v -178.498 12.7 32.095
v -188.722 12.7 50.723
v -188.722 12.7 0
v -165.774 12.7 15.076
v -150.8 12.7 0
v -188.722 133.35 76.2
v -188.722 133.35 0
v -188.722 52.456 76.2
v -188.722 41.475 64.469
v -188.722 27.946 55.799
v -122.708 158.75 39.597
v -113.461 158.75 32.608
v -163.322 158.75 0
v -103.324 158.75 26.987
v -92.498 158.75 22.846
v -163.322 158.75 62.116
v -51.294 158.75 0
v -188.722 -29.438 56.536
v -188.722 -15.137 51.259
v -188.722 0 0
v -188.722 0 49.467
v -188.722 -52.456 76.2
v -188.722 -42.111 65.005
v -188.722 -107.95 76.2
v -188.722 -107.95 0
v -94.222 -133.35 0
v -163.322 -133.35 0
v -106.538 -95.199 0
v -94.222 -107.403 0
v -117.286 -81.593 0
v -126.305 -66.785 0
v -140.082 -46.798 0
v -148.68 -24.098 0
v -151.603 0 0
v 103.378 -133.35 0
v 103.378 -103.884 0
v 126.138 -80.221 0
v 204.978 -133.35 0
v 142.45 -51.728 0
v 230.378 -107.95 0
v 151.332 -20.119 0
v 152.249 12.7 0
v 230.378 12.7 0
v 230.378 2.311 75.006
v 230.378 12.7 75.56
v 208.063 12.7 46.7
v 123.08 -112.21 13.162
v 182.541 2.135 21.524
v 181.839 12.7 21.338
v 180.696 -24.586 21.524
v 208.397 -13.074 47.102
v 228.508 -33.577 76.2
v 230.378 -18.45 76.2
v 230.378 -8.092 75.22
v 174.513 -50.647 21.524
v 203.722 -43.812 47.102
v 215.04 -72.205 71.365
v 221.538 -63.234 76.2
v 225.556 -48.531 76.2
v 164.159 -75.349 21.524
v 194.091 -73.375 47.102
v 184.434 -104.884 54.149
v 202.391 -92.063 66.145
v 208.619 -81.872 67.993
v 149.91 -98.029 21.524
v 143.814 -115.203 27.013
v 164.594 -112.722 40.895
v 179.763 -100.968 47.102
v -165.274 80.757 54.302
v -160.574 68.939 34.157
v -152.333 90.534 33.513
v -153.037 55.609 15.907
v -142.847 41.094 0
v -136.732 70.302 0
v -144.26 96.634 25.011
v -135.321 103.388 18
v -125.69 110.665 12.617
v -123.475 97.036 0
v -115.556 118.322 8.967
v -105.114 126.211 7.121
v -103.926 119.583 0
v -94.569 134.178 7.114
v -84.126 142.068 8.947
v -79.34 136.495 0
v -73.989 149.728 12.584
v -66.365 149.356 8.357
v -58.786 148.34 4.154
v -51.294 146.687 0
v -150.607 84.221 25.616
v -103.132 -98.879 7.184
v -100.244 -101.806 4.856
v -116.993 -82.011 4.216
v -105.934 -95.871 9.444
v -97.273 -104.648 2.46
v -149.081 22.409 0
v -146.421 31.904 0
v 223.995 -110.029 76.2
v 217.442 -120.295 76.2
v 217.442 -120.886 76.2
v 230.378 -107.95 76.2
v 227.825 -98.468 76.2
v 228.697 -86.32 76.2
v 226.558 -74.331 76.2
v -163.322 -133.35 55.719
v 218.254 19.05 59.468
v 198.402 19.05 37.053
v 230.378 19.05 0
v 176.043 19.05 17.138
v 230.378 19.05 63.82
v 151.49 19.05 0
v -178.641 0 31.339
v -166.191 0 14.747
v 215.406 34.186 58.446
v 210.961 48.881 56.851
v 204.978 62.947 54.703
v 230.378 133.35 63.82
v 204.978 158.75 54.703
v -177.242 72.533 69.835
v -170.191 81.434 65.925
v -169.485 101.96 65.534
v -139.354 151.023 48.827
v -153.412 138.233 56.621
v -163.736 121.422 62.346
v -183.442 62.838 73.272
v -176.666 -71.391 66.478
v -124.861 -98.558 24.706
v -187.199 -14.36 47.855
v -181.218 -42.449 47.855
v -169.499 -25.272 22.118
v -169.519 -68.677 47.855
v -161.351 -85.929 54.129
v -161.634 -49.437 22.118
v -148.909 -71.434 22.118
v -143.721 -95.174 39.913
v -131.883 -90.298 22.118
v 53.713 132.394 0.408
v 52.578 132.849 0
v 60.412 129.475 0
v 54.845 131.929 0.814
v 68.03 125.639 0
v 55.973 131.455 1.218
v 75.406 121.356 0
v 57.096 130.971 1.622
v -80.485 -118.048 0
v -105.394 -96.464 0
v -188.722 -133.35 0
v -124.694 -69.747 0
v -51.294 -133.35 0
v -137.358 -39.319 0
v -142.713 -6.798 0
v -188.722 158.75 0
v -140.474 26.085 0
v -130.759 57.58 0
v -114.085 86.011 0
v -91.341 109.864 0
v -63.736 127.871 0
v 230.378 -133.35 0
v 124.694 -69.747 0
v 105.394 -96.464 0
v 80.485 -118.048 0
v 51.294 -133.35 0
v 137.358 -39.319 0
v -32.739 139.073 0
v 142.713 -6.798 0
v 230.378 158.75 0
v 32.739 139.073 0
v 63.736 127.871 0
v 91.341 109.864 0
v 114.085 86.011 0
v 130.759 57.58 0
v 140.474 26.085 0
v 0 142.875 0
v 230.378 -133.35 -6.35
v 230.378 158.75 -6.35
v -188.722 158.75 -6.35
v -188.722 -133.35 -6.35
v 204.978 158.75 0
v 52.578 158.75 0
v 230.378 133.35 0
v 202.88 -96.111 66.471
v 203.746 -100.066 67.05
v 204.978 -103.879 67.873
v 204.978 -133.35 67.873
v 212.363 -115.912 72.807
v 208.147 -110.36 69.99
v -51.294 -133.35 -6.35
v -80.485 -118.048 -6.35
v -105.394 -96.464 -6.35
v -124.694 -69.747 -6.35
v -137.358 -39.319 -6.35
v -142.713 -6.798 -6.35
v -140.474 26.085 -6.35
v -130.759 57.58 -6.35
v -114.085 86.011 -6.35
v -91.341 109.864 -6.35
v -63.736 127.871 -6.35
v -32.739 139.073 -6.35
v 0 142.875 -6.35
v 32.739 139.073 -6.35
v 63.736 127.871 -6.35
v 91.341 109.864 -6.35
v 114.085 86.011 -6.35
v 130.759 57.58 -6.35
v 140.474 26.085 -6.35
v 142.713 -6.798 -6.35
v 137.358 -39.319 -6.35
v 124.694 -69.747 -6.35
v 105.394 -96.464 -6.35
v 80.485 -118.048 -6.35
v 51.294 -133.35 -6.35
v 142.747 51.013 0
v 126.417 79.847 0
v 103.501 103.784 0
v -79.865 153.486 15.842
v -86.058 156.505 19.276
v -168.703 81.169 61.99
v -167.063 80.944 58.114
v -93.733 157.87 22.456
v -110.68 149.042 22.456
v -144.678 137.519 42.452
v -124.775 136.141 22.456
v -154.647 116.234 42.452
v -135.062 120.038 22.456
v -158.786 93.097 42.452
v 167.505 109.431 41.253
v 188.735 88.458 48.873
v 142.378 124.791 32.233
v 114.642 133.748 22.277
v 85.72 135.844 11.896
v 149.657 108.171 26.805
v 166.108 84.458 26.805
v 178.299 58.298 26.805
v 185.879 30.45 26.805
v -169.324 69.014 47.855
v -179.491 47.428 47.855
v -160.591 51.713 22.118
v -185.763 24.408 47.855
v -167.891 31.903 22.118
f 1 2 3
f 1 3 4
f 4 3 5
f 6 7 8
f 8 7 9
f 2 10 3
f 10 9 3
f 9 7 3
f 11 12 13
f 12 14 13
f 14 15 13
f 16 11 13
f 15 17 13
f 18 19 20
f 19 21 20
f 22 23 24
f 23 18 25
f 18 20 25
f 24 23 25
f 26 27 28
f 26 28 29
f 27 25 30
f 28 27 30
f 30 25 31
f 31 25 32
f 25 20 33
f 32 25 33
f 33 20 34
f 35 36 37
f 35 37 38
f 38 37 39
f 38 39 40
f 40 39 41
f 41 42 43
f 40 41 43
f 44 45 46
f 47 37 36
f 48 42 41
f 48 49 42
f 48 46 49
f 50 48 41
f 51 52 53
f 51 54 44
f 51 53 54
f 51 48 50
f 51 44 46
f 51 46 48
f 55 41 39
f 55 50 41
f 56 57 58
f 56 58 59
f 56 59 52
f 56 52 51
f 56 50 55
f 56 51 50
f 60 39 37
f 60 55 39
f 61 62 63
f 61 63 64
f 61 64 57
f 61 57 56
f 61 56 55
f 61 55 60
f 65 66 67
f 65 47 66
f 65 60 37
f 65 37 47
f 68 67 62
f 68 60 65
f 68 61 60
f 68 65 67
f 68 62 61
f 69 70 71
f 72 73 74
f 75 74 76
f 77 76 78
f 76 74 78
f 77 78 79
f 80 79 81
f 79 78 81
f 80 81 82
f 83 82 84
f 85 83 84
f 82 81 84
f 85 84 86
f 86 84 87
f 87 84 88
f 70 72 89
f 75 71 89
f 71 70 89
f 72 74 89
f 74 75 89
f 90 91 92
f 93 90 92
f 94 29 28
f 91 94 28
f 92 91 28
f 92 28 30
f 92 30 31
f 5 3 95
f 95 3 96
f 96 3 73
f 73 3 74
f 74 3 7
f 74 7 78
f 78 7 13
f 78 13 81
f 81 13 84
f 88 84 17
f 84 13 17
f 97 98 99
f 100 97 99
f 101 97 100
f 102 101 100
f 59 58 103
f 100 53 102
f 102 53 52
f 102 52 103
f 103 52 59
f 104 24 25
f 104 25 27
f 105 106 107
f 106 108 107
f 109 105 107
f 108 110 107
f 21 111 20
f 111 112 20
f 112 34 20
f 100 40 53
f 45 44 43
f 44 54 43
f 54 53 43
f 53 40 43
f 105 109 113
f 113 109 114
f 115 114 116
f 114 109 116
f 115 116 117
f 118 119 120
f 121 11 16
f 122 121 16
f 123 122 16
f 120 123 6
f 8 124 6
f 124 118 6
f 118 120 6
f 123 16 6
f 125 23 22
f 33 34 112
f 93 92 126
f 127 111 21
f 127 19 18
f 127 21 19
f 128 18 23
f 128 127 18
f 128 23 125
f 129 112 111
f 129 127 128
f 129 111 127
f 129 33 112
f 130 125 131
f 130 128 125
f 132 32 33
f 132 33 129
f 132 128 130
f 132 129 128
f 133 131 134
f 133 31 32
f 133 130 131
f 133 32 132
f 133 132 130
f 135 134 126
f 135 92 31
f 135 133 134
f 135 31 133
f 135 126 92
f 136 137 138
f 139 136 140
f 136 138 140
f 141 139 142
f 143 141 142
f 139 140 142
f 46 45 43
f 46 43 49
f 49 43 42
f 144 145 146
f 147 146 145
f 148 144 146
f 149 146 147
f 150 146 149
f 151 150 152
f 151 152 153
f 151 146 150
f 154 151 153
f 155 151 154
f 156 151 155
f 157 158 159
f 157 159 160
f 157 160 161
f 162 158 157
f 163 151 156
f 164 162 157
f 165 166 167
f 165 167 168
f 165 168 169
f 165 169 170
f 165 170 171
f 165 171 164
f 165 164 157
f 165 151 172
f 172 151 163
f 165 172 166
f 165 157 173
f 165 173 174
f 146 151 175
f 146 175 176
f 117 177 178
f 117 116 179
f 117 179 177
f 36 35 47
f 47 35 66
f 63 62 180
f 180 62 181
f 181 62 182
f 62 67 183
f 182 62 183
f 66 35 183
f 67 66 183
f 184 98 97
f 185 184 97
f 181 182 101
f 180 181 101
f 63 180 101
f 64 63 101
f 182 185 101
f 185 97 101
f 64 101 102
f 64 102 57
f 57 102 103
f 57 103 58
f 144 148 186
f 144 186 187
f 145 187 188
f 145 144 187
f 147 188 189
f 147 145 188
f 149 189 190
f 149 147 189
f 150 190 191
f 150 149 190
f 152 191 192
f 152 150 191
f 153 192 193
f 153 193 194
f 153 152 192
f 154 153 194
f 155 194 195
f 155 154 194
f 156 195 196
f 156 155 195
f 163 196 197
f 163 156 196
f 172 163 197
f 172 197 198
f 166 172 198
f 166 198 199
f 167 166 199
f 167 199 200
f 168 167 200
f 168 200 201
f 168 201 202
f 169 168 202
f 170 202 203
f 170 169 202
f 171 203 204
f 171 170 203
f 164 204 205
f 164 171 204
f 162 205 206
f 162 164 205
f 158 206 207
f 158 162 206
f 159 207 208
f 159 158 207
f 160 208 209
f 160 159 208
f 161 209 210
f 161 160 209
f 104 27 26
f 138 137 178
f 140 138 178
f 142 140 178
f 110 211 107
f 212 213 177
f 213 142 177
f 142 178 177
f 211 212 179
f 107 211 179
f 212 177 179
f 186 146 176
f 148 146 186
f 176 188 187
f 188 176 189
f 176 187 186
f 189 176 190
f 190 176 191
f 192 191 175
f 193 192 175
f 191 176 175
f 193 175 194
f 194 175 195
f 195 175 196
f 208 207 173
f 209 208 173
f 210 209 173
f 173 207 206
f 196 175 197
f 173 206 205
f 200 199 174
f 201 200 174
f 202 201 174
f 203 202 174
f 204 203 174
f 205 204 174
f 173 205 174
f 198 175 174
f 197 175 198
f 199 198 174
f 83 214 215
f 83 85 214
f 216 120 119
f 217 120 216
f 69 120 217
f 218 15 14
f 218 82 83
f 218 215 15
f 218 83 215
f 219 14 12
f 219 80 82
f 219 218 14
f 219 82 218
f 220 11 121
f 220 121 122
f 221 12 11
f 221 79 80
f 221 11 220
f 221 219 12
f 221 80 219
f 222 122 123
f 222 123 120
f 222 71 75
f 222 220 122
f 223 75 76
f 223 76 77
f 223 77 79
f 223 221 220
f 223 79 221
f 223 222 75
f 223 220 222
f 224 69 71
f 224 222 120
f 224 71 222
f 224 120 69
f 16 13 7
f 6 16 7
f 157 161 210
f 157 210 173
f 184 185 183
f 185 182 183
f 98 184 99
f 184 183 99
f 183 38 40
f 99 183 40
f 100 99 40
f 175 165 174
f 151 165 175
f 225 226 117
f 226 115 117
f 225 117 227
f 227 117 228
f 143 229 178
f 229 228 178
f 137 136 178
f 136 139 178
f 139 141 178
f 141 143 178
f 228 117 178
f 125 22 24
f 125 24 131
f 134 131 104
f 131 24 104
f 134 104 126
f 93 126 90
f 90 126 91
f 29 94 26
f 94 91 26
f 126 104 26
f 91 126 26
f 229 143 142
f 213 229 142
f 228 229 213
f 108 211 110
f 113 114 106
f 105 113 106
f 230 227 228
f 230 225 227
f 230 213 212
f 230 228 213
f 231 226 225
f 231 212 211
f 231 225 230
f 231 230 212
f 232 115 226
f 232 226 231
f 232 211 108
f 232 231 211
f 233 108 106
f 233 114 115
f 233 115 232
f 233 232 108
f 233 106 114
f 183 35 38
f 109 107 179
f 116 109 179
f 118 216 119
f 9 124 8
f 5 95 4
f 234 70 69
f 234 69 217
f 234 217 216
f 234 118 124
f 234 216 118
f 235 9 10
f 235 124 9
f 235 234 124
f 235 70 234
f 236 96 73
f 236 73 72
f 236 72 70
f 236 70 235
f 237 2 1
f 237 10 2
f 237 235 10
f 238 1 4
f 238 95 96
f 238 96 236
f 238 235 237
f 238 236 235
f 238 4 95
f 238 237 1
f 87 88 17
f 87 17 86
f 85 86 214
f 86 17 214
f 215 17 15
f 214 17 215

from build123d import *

# Parameters (mm, degrees)
F1_DEPTH       = 6.35
F3_DEPTH       = 76.2
F11_DEPTH      = 76.2
F13_DEPTH      = 127
F15_DEPTH      = 152.4
F17_DEPTH      = 152.4
F19_REACH      = 112.1220245843
F21_DEPTH      = 152.4
F25_DEPTH      = 152.4
F27_DEPTH      = 152.4
F31_DEPTH      = 76.201
F33_DEPTH      = 76.201
F36_ANGLE_BACK = 90
F36_ANGLE      = 180


with BuildPart() as f1:
    # F0 (on Top) → F1 (new body)
    with BuildSketch(Plane.XY):
        with BuildLine():
            Line((230.378, 158.75), (-188.722, 158.75))
            Line((-188.722, 158.75), (-188.722, -133.35))
            Line((-188.722, -133.35), (-51.293694788, -133.35))
            ThreePointArc((-51.293694788, -133.35), (-80.8847296533, 117.7748960259), (142.875, 0))
            ThreePointArc((142.875, 0), (117.7748960259, -80.8847296533), (51.293694788, -133.35))
            Line((51.2936947879, -133.35), (230.378, -133.35))
            Line((230.378, -133.35), (230.378, 158.75))
        make_face()
    extrude(amount=-F1_DEPTH)


with BuildPart() as f3:
    # F2 (on face) → F3 (new body)
    with BuildSketch(Plane.XY):
        with BuildLine():
            Line((-51.293694788, 133.35), (-51.293694788, 158.75))
            Line((-51.293694788, 158.75), (-188.722, 158.75))
            Line((-188.722, 158.75), (-188.722, 12.7))
            Line((-188.722, 12.7), (-142.3094361769, 12.7))
            ThreePointArc((-142.3094361769, 12.7), (-114.0598470315, 86.0442730235), (-51.293694788, 133.35))
        make_face()
    extrude(amount=F3_DEPTH)


with BuildPart() as f3b:
    # F2 (on face) → F3, piece 2 (new body)
    with BuildSketch(Plane.XY):
        with BuildLine():
            ThreePointArc((-94.2220017314, -107.4033519716), (-130.1446005841, -58.9546314026), (-142.875, 0))
            Line((-142.875, 0), (-188.722, 0))
            Line((-188.722, 0), (-188.722, -133.35))
            Line((-188.722, -133.35), (-94.2220017314, -133.35))
            Line((-94.2220017314, -133.35), (-94.2220017314, -107.4033519716))
        make_face()
    extrude(amount=F3_DEPTH)


with BuildPart() as f3c:
    # F2 (on face) → F3, piece 3 (new body)
    with BuildSketch(Plane.XY):
        with BuildLine():
            Line((230.378, -133.35), (230.378, 12.7))
            Line((230.378, 12.7), (142.3094361769, 12.7))
            ThreePointArc((142.3094361769, 12.7), (142.7335390138, 6.356293386), (142.875, 0))
            ThreePointArc((142.875, 0), (132.6337011755, -53.1184237106), (103.378, -98.6217762008))
            Line((103.378, -98.6217762008), (103.378, -133.35))
            Line((103.378, -133.35), (230.378, -133.35))
        make_face()
    extrude(amount=F3_DEPTH)


with BuildPart() as f3d:
    # F2 (on face) → F3, piece 4 (new body)
    with BuildSketch(Plane.XY):
        with BuildLine():
            Line((230.378, 19.05), (230.378, 158.75))
            Line((230.378, 158.75), (52.578, 158.75))
            Line((52.578, 158.75), (52.578, 132.8488597655))
            ThreePointArc((52.578, 132.8488597655), (112.5333352727, 88.0313244101), (141.5993048182, 19.05))
            Line((141.5993048182, 19.05), (230.378, 19.05))
        make_face()
    extrude(amount=F3_DEPTH)


with BuildPart() as f5_tool:
    # F4 (on Front) → F5 (revolve)
    with BuildSketch(Plane.XZ):
        with BuildLine():
            ThreePointArc((43.0044271052, -36.9679209035), (206.9335071058, 44.9737359045), (273.05, 215.9))
            ThreePointArc((273.05, 215.9), (206.9335071058, 386.8262640955), (43.0044271052, 468.7679209035))
            Line((43.0044271052, 468.7679209035), (43.0044271052, -36.9679209035))
        make_face()
    revolve(axis=Axis((19.05, 0, 121.6264636263), (0, 0, -1)))


with BuildPart() as f3_1:
    add(f3.part)

    # F5: cut by f5_tool
    add(f5_tool.part, mode=Mode.SUBTRACT)


with BuildPart() as f3b_1:
    add(f3b.part)

    # F5: cut by f5_tool
    add(f5_tool.part, mode=Mode.SUBTRACT)


with BuildPart() as f3c_1:
    add(f3c.part)

    # F5: cut by f5_tool
    add(f5_tool.part, mode=Mode.SUBTRACT)

    # F8 (on offset) → F9 (revolve, cut)
    with BuildSketch(Plane.XZ.offset(88.9)):
        with BuildLine():
            ThreePointArc((179.578, 63.5), (251.4200489686, 93.2579510314), (281.178, 165.1))
            ThreePointArc((281.178, 165.1), (251.4200489686, 236.9420489686), (179.578, 266.7))
            Line((179.578, 266.7), (179.578, 179.8048467159))
            Line((179.578, 179.8048467159), (179.578, 105.8732718945))
            Line((179.578, 105.8732718945), (179.578, 63.5))
        make_face()
    revolve(axis=Axis((179.578, -88.9, 186.2866359472), (0, 0, 1)), mode=Mode.SUBTRACT)

    # F10 (on face) → F11 (cut)
    with BuildSketch(Plane.XZ.offset(133.35)):
        with BuildLine():
            Line((86.0403324599, 0), (103.378, 0))
            Line((103.378, 0), (103.378, 16.8458216565))
            ThreePointArc((103.378, 16.8458216565), (132.8035768164, 32.068824022), (159.5575009242, 51.6093438931))
            Line((159.5575009242, 51.6093438931), (170.857608201, 61.9901965686))
            Line((170.857608201, 61.9901965686), (86.0403324599, 61.9901965686))
            Line((86.0403324599, 61.9901965686), (86.0403324599, 0))
        make_face()
        with BuildLine():
            Line((103.378, 16.8458216565), (103.378, 0))
            Line((103.378, 0), (159.5575009242, 51.6093438931))
            ThreePointArc((159.5575009242, 51.6093438931), (132.8035768164, 32.068824022), (103.378, 16.8458216565))
        make_face()
    extrude(amount=-F11_DEPTH, mode=Mode.SUBTRACT)

    # F12 (on face) → F13 (cut)
    with BuildSketch(Plane(origin=(0, 0, 0), x_dir=(1, 0, 0), z_dir=(0, 0, -1))):
        Polygon((230.378, 107.95), (230.378, 133.35), (204.978, 133.35), align=None)
    extrude(amount=-F13_DEPTH, mode=Mode.SUBTRACT)

    # F16 (on face) → F17 (cut)
    with BuildSketch(Plane.XZ.offset(133.35)):
        with BuildLine():
            Line((81.6757380962, 94.7376266122), (103.378, 0))
            Line((103.378, 0), (159.5575009242, 51.6093438931))
            ThreePointArc((159.5575009242, 51.6093438931), (171.1523609482, 62.2814812792), (181.9389750578, 73.7699211827))
            ThreePointArc((181.9389750578, 73.7699211827), (191.3516351124, 74.5012195654), (200.6385674188, 76.2))
            Line((200.6385674188, 76.2), (204.978, 76.2))
            Line((204.978, 76.2), (204.978, 67.873233951))
            Line((204.978, 67.873233951), (231.3560694456, 85.4949355125))
            Line((231.3560694456, 85.4949355125), (81.6757380962, 94.7376266122))
        make_face()
        with BuildLine():
            Line((159.5575009242, 51.6093438931), (103.378, 0))
            Line((103.378, 0), (204.978, 67.873233951))
            Line((204.978, 67.873233951), (204.978, 76.2))
            Line((204.978, 76.2), (200.6385674188, 76.2))
            ThreePointArc((200.6385674188, 76.2), (191.3516351124, 74.5012195654), (181.9389750578, 73.7699211827))
            ThreePointArc((181.9389750578, 73.7699211827), (171.1523609482, 62.2814812792), (159.5575009242, 51.6093438931))
        make_face()
    extrude(amount=-F17_DEPTH, mode=Mode.SUBTRACT)


with BuildPart() as f3d_1:
    add(f3d.part)

    # F5: cut by f5_tool
    add(f5_tool.part, mode=Mode.SUBTRACT)

    # F14 (on face) → F15 (cut)
    with BuildSketch(Plane(origin=(0, 158.75, 0), x_dir=(-1, 0, 0), z_dir=(0, 1, 0))):
        with BuildLine():
            Line((-230.378, 76.2), (-52.578, 0))
            Line((-52.578, 0), (-52.578, 20.4765860599))
            ThreePointArc((-52.578, 20.4765860599), (-110.5141937677, 39.9774637563), (-159.7566007691, 76.2))
            Line((-159.7566007691, 76.2), (-230.378, 76.2))
        make_face()
        with BuildLine():
            Line((-52.578, 20.4765860599), (-52.578, 0))
            Line((-52.578, 0), (-8.8528534397, 51.8463514745))
            Line((-8.8528534397, 51.8463514745), (-213.0013555288, 128.0403733253))
            Line((-213.0013555288, 128.0403733253), (-230.378, 76.2))
            Line((-230.378, 76.2), (-159.7566007691, 76.2))
            ThreePointArc((-159.7566007691, 76.2), (-110.5141937677, 39.9774637563), (-52.578, 20.4765860599))
        make_face()
    extrude(amount=-F15_DEPTH, mode=Mode.SUBTRACT)

    f19_end = f3d_1.faces().sort_by_distance((171.0382708789, 128.792792972, 50.7686875195))[0]
    # F18 (on face) → F19 (cut, up to a face of the model that its end follows)
    with BuildSketch(Plane(origin=(0, 0, 0), x_dir=(1, 0, 0), z_dir=(0, 0, -1))):
        Polygon((204.978, -158.75), (230.378, -158.75), (230.378, -133.35), align=None)
    f19_long = extrude(amount=-F19_REACH, mode=Mode.PRIVATE)
    add(split(f19_long, bisect_by=f19_end, keep=Keep.BOTTOM, mode=Mode.PRIVATE), mode=Mode.SUBTRACT)

    # F20 (on face) → F21 (cut)
    with BuildSketch(Plane(origin=(0, 158.75, 0), x_dir=(-1, 0, 0), z_dir=(0, 1, 0))):
        Polygon((-204.978, 65.3142857143), (-52.578, 0), (-166.017100215, 113.822966814), (-247.382119298, 121.0022349213), (-247.382119298, 69.9237659574), (-204.978, 54.7030625959), align=None)
        Polygon((-204.978, 54.7030625959), (-52.578, 0), (-204.978, 65.3142857143), align=None)
    extrude(amount=-F21_DEPTH, mode=Mode.SUBTRACT)


with BuildPart() as f23_tool:
    # F22 (on Front) → F23 (revolve)
    with BuildSketch(Plane.XZ):
        with BuildLine():
            Line((-50.8, 87.3236291427), (-50.8, 266.7))
            ThreePointArc((-50.8, 266.7), (-203.2, 114.3), (-50.8, -38.1))
            Line((-50.8, -38.1), (-50.8, 13.3920543212))
            Line((-50.8, 13.3920543212), (-50.8, 87.3236291427))
        make_face()
    revolve(axis=Axis((-50.8, 0, 140.0460271606), (0, 0, 1)))


with BuildPart() as f3_2:
    add(f3_1.part)

    # F23: cut by f23_tool
    add(f23_tool.part, mode=Mode.SUBTRACT)

    # F26 (on face) → F27 (cut)
    with BuildSketch(Plane(origin=(0, 158.75, 0), x_dir=(-1, 0, 0), z_dir=(0, 1, 0))):
        with BuildLine():
            Line((51.293694788, 30.5187655031), (51.293694788, 0))
            Line((51.293694788, 0), (188.722, 76.2))
            Line((188.722, 76.2), (121.6566007691, 76.2))
            ThreePointArc((121.6566007691, 76.2), (88.9187483023, 49.5954994896), (51.293694788, 30.5187655031))
        make_face()
        with BuildLine():
            Line((16.027521342, 114.0955016017), (51.293694788, 0))
            Line((51.293694788, 0), (51.293694788, 30.5187655031))
            ThreePointArc((51.293694788, 30.5187655031), (88.9187483023, 49.5954994896), (121.6566007691, 76.2))
            Line((121.6566007691, 76.2), (188.722, 76.2))
            Line((188.722, 76.2), (202.6786208153, 107.6769605279))
            Line((202.6786208153, 107.6769605279), (16.027521342, 114.0955016017))
        make_face()
    extrude(amount=-F27_DEPTH, mode=Mode.SUBTRACT)

    # F28 (on offset) → F29 (revolve, cut)
    with BuildSketch(Plane.XZ.offset(-88.9)):
        with BuildLine():
            Line((-68.58, -6.35), (-68.58, 209.55))
            ThreePointArc((-68.58, 209.55), (-176.53, 101.6), (-68.58, -6.35))
        make_face()
    revolve(axis=Axis((-68.58, 88.9, 101.6), (0, 0, 1)), mode=Mode.SUBTRACT)

    # F32 (on face) → F33 (cut, through all)
    with BuildSketch(Plane(origin=(0, 0, 0), x_dir=(1, 0, 0), z_dir=(0, 0, -1))):
        Polygon((-188.722, -133.35), (-188.722, -158.75), (-163.322, -158.75), align=None)
    extrude(amount=-F33_DEPTH, mode=Mode.SUBTRACT)

    # F35 (on offset) → F36 (revolve, cut)
    with BuildSketch(Plane.XZ.offset(-31.75), mode=Mode.PRIVATE) as f36_sk:
        with BuildLine():
            Line((-25.4, -53.975), (-25.4, 257.175))
            ThreePointArc((-25.4, 257.175), (-180.975, 101.6), (-25.4, -53.975))
        make_face()
    revolve(f36_sk.sketch.rotate(Axis((-25.4, 31.75, 101.6), (0, 0, -1)), -F36_ANGLE_BACK), axis=Axis((-25.4, 31.75, 101.6), (0, 0, -1)), revolution_arc=F36_ANGLE, mode=Mode.SUBTRACT)


with BuildPart() as f3b_2:
    add(f3b_1.part)

    # F23: cut by f23_tool
    add(f23_tool.part, mode=Mode.SUBTRACT)

    # F24 (on face) → F25 (cut)
    with BuildSketch(Plane.XZ.offset(133.35)):
        with BuildLine():
            Line((-94.2220017314, 31.7716992862), (-94.2220017314, 0))
            Line((-94.2220017314, 0), (-40.7899729908, 17.2016825527))
            Line((-40.7899729908, 17.2016825527), (-76.9905298948, 100.385941565))
            Line((-76.9905298948, 100.385941565), (-166.8500751257, 100.385941565))
            Line((-166.8500751257, 100.385941565), (-188.722, 76.2))
            Line((-188.722, 76.2), (-145.9278394209, 76.2))
            ThreePointArc((-145.9278394209, 76.2), (-121.8372315059, 51.9348649908), (-94.2220017314, 31.7716992862))
        make_face()
        with BuildLine():
            Line((-188.722, 76.2), (-94.2220017314, 0))
            Line((-94.2220017314, 0), (-94.2220017314, 31.7716992862))
            ThreePointArc((-94.2220017314, 31.7716992862), (-121.8372315059, 51.9348649908), (-145.9278394209, 76.2))
            Line((-145.9278394209, 76.2), (-188.722, 76.2))
        make_face()
    extrude(amount=-F25_DEPTH, mode=Mode.SUBTRACT)

    # F30 (on face) → F31 (cut, through all)
    with BuildSketch(Plane(origin=(0, 0, 0), x_dir=(1, 0, 0), z_dir=(0, 0, -1))):
        Polygon((-163.322, 133.35), (-188.722, 133.35), (-188.722, 107.95), align=None)
    extrude(amount=-F31_DEPTH, mode=Mode.SUBTRACT)


solid = Compound([f1.part, f3c_1.part, f3d_1.part, f3_2.part, f3b_2.part])
